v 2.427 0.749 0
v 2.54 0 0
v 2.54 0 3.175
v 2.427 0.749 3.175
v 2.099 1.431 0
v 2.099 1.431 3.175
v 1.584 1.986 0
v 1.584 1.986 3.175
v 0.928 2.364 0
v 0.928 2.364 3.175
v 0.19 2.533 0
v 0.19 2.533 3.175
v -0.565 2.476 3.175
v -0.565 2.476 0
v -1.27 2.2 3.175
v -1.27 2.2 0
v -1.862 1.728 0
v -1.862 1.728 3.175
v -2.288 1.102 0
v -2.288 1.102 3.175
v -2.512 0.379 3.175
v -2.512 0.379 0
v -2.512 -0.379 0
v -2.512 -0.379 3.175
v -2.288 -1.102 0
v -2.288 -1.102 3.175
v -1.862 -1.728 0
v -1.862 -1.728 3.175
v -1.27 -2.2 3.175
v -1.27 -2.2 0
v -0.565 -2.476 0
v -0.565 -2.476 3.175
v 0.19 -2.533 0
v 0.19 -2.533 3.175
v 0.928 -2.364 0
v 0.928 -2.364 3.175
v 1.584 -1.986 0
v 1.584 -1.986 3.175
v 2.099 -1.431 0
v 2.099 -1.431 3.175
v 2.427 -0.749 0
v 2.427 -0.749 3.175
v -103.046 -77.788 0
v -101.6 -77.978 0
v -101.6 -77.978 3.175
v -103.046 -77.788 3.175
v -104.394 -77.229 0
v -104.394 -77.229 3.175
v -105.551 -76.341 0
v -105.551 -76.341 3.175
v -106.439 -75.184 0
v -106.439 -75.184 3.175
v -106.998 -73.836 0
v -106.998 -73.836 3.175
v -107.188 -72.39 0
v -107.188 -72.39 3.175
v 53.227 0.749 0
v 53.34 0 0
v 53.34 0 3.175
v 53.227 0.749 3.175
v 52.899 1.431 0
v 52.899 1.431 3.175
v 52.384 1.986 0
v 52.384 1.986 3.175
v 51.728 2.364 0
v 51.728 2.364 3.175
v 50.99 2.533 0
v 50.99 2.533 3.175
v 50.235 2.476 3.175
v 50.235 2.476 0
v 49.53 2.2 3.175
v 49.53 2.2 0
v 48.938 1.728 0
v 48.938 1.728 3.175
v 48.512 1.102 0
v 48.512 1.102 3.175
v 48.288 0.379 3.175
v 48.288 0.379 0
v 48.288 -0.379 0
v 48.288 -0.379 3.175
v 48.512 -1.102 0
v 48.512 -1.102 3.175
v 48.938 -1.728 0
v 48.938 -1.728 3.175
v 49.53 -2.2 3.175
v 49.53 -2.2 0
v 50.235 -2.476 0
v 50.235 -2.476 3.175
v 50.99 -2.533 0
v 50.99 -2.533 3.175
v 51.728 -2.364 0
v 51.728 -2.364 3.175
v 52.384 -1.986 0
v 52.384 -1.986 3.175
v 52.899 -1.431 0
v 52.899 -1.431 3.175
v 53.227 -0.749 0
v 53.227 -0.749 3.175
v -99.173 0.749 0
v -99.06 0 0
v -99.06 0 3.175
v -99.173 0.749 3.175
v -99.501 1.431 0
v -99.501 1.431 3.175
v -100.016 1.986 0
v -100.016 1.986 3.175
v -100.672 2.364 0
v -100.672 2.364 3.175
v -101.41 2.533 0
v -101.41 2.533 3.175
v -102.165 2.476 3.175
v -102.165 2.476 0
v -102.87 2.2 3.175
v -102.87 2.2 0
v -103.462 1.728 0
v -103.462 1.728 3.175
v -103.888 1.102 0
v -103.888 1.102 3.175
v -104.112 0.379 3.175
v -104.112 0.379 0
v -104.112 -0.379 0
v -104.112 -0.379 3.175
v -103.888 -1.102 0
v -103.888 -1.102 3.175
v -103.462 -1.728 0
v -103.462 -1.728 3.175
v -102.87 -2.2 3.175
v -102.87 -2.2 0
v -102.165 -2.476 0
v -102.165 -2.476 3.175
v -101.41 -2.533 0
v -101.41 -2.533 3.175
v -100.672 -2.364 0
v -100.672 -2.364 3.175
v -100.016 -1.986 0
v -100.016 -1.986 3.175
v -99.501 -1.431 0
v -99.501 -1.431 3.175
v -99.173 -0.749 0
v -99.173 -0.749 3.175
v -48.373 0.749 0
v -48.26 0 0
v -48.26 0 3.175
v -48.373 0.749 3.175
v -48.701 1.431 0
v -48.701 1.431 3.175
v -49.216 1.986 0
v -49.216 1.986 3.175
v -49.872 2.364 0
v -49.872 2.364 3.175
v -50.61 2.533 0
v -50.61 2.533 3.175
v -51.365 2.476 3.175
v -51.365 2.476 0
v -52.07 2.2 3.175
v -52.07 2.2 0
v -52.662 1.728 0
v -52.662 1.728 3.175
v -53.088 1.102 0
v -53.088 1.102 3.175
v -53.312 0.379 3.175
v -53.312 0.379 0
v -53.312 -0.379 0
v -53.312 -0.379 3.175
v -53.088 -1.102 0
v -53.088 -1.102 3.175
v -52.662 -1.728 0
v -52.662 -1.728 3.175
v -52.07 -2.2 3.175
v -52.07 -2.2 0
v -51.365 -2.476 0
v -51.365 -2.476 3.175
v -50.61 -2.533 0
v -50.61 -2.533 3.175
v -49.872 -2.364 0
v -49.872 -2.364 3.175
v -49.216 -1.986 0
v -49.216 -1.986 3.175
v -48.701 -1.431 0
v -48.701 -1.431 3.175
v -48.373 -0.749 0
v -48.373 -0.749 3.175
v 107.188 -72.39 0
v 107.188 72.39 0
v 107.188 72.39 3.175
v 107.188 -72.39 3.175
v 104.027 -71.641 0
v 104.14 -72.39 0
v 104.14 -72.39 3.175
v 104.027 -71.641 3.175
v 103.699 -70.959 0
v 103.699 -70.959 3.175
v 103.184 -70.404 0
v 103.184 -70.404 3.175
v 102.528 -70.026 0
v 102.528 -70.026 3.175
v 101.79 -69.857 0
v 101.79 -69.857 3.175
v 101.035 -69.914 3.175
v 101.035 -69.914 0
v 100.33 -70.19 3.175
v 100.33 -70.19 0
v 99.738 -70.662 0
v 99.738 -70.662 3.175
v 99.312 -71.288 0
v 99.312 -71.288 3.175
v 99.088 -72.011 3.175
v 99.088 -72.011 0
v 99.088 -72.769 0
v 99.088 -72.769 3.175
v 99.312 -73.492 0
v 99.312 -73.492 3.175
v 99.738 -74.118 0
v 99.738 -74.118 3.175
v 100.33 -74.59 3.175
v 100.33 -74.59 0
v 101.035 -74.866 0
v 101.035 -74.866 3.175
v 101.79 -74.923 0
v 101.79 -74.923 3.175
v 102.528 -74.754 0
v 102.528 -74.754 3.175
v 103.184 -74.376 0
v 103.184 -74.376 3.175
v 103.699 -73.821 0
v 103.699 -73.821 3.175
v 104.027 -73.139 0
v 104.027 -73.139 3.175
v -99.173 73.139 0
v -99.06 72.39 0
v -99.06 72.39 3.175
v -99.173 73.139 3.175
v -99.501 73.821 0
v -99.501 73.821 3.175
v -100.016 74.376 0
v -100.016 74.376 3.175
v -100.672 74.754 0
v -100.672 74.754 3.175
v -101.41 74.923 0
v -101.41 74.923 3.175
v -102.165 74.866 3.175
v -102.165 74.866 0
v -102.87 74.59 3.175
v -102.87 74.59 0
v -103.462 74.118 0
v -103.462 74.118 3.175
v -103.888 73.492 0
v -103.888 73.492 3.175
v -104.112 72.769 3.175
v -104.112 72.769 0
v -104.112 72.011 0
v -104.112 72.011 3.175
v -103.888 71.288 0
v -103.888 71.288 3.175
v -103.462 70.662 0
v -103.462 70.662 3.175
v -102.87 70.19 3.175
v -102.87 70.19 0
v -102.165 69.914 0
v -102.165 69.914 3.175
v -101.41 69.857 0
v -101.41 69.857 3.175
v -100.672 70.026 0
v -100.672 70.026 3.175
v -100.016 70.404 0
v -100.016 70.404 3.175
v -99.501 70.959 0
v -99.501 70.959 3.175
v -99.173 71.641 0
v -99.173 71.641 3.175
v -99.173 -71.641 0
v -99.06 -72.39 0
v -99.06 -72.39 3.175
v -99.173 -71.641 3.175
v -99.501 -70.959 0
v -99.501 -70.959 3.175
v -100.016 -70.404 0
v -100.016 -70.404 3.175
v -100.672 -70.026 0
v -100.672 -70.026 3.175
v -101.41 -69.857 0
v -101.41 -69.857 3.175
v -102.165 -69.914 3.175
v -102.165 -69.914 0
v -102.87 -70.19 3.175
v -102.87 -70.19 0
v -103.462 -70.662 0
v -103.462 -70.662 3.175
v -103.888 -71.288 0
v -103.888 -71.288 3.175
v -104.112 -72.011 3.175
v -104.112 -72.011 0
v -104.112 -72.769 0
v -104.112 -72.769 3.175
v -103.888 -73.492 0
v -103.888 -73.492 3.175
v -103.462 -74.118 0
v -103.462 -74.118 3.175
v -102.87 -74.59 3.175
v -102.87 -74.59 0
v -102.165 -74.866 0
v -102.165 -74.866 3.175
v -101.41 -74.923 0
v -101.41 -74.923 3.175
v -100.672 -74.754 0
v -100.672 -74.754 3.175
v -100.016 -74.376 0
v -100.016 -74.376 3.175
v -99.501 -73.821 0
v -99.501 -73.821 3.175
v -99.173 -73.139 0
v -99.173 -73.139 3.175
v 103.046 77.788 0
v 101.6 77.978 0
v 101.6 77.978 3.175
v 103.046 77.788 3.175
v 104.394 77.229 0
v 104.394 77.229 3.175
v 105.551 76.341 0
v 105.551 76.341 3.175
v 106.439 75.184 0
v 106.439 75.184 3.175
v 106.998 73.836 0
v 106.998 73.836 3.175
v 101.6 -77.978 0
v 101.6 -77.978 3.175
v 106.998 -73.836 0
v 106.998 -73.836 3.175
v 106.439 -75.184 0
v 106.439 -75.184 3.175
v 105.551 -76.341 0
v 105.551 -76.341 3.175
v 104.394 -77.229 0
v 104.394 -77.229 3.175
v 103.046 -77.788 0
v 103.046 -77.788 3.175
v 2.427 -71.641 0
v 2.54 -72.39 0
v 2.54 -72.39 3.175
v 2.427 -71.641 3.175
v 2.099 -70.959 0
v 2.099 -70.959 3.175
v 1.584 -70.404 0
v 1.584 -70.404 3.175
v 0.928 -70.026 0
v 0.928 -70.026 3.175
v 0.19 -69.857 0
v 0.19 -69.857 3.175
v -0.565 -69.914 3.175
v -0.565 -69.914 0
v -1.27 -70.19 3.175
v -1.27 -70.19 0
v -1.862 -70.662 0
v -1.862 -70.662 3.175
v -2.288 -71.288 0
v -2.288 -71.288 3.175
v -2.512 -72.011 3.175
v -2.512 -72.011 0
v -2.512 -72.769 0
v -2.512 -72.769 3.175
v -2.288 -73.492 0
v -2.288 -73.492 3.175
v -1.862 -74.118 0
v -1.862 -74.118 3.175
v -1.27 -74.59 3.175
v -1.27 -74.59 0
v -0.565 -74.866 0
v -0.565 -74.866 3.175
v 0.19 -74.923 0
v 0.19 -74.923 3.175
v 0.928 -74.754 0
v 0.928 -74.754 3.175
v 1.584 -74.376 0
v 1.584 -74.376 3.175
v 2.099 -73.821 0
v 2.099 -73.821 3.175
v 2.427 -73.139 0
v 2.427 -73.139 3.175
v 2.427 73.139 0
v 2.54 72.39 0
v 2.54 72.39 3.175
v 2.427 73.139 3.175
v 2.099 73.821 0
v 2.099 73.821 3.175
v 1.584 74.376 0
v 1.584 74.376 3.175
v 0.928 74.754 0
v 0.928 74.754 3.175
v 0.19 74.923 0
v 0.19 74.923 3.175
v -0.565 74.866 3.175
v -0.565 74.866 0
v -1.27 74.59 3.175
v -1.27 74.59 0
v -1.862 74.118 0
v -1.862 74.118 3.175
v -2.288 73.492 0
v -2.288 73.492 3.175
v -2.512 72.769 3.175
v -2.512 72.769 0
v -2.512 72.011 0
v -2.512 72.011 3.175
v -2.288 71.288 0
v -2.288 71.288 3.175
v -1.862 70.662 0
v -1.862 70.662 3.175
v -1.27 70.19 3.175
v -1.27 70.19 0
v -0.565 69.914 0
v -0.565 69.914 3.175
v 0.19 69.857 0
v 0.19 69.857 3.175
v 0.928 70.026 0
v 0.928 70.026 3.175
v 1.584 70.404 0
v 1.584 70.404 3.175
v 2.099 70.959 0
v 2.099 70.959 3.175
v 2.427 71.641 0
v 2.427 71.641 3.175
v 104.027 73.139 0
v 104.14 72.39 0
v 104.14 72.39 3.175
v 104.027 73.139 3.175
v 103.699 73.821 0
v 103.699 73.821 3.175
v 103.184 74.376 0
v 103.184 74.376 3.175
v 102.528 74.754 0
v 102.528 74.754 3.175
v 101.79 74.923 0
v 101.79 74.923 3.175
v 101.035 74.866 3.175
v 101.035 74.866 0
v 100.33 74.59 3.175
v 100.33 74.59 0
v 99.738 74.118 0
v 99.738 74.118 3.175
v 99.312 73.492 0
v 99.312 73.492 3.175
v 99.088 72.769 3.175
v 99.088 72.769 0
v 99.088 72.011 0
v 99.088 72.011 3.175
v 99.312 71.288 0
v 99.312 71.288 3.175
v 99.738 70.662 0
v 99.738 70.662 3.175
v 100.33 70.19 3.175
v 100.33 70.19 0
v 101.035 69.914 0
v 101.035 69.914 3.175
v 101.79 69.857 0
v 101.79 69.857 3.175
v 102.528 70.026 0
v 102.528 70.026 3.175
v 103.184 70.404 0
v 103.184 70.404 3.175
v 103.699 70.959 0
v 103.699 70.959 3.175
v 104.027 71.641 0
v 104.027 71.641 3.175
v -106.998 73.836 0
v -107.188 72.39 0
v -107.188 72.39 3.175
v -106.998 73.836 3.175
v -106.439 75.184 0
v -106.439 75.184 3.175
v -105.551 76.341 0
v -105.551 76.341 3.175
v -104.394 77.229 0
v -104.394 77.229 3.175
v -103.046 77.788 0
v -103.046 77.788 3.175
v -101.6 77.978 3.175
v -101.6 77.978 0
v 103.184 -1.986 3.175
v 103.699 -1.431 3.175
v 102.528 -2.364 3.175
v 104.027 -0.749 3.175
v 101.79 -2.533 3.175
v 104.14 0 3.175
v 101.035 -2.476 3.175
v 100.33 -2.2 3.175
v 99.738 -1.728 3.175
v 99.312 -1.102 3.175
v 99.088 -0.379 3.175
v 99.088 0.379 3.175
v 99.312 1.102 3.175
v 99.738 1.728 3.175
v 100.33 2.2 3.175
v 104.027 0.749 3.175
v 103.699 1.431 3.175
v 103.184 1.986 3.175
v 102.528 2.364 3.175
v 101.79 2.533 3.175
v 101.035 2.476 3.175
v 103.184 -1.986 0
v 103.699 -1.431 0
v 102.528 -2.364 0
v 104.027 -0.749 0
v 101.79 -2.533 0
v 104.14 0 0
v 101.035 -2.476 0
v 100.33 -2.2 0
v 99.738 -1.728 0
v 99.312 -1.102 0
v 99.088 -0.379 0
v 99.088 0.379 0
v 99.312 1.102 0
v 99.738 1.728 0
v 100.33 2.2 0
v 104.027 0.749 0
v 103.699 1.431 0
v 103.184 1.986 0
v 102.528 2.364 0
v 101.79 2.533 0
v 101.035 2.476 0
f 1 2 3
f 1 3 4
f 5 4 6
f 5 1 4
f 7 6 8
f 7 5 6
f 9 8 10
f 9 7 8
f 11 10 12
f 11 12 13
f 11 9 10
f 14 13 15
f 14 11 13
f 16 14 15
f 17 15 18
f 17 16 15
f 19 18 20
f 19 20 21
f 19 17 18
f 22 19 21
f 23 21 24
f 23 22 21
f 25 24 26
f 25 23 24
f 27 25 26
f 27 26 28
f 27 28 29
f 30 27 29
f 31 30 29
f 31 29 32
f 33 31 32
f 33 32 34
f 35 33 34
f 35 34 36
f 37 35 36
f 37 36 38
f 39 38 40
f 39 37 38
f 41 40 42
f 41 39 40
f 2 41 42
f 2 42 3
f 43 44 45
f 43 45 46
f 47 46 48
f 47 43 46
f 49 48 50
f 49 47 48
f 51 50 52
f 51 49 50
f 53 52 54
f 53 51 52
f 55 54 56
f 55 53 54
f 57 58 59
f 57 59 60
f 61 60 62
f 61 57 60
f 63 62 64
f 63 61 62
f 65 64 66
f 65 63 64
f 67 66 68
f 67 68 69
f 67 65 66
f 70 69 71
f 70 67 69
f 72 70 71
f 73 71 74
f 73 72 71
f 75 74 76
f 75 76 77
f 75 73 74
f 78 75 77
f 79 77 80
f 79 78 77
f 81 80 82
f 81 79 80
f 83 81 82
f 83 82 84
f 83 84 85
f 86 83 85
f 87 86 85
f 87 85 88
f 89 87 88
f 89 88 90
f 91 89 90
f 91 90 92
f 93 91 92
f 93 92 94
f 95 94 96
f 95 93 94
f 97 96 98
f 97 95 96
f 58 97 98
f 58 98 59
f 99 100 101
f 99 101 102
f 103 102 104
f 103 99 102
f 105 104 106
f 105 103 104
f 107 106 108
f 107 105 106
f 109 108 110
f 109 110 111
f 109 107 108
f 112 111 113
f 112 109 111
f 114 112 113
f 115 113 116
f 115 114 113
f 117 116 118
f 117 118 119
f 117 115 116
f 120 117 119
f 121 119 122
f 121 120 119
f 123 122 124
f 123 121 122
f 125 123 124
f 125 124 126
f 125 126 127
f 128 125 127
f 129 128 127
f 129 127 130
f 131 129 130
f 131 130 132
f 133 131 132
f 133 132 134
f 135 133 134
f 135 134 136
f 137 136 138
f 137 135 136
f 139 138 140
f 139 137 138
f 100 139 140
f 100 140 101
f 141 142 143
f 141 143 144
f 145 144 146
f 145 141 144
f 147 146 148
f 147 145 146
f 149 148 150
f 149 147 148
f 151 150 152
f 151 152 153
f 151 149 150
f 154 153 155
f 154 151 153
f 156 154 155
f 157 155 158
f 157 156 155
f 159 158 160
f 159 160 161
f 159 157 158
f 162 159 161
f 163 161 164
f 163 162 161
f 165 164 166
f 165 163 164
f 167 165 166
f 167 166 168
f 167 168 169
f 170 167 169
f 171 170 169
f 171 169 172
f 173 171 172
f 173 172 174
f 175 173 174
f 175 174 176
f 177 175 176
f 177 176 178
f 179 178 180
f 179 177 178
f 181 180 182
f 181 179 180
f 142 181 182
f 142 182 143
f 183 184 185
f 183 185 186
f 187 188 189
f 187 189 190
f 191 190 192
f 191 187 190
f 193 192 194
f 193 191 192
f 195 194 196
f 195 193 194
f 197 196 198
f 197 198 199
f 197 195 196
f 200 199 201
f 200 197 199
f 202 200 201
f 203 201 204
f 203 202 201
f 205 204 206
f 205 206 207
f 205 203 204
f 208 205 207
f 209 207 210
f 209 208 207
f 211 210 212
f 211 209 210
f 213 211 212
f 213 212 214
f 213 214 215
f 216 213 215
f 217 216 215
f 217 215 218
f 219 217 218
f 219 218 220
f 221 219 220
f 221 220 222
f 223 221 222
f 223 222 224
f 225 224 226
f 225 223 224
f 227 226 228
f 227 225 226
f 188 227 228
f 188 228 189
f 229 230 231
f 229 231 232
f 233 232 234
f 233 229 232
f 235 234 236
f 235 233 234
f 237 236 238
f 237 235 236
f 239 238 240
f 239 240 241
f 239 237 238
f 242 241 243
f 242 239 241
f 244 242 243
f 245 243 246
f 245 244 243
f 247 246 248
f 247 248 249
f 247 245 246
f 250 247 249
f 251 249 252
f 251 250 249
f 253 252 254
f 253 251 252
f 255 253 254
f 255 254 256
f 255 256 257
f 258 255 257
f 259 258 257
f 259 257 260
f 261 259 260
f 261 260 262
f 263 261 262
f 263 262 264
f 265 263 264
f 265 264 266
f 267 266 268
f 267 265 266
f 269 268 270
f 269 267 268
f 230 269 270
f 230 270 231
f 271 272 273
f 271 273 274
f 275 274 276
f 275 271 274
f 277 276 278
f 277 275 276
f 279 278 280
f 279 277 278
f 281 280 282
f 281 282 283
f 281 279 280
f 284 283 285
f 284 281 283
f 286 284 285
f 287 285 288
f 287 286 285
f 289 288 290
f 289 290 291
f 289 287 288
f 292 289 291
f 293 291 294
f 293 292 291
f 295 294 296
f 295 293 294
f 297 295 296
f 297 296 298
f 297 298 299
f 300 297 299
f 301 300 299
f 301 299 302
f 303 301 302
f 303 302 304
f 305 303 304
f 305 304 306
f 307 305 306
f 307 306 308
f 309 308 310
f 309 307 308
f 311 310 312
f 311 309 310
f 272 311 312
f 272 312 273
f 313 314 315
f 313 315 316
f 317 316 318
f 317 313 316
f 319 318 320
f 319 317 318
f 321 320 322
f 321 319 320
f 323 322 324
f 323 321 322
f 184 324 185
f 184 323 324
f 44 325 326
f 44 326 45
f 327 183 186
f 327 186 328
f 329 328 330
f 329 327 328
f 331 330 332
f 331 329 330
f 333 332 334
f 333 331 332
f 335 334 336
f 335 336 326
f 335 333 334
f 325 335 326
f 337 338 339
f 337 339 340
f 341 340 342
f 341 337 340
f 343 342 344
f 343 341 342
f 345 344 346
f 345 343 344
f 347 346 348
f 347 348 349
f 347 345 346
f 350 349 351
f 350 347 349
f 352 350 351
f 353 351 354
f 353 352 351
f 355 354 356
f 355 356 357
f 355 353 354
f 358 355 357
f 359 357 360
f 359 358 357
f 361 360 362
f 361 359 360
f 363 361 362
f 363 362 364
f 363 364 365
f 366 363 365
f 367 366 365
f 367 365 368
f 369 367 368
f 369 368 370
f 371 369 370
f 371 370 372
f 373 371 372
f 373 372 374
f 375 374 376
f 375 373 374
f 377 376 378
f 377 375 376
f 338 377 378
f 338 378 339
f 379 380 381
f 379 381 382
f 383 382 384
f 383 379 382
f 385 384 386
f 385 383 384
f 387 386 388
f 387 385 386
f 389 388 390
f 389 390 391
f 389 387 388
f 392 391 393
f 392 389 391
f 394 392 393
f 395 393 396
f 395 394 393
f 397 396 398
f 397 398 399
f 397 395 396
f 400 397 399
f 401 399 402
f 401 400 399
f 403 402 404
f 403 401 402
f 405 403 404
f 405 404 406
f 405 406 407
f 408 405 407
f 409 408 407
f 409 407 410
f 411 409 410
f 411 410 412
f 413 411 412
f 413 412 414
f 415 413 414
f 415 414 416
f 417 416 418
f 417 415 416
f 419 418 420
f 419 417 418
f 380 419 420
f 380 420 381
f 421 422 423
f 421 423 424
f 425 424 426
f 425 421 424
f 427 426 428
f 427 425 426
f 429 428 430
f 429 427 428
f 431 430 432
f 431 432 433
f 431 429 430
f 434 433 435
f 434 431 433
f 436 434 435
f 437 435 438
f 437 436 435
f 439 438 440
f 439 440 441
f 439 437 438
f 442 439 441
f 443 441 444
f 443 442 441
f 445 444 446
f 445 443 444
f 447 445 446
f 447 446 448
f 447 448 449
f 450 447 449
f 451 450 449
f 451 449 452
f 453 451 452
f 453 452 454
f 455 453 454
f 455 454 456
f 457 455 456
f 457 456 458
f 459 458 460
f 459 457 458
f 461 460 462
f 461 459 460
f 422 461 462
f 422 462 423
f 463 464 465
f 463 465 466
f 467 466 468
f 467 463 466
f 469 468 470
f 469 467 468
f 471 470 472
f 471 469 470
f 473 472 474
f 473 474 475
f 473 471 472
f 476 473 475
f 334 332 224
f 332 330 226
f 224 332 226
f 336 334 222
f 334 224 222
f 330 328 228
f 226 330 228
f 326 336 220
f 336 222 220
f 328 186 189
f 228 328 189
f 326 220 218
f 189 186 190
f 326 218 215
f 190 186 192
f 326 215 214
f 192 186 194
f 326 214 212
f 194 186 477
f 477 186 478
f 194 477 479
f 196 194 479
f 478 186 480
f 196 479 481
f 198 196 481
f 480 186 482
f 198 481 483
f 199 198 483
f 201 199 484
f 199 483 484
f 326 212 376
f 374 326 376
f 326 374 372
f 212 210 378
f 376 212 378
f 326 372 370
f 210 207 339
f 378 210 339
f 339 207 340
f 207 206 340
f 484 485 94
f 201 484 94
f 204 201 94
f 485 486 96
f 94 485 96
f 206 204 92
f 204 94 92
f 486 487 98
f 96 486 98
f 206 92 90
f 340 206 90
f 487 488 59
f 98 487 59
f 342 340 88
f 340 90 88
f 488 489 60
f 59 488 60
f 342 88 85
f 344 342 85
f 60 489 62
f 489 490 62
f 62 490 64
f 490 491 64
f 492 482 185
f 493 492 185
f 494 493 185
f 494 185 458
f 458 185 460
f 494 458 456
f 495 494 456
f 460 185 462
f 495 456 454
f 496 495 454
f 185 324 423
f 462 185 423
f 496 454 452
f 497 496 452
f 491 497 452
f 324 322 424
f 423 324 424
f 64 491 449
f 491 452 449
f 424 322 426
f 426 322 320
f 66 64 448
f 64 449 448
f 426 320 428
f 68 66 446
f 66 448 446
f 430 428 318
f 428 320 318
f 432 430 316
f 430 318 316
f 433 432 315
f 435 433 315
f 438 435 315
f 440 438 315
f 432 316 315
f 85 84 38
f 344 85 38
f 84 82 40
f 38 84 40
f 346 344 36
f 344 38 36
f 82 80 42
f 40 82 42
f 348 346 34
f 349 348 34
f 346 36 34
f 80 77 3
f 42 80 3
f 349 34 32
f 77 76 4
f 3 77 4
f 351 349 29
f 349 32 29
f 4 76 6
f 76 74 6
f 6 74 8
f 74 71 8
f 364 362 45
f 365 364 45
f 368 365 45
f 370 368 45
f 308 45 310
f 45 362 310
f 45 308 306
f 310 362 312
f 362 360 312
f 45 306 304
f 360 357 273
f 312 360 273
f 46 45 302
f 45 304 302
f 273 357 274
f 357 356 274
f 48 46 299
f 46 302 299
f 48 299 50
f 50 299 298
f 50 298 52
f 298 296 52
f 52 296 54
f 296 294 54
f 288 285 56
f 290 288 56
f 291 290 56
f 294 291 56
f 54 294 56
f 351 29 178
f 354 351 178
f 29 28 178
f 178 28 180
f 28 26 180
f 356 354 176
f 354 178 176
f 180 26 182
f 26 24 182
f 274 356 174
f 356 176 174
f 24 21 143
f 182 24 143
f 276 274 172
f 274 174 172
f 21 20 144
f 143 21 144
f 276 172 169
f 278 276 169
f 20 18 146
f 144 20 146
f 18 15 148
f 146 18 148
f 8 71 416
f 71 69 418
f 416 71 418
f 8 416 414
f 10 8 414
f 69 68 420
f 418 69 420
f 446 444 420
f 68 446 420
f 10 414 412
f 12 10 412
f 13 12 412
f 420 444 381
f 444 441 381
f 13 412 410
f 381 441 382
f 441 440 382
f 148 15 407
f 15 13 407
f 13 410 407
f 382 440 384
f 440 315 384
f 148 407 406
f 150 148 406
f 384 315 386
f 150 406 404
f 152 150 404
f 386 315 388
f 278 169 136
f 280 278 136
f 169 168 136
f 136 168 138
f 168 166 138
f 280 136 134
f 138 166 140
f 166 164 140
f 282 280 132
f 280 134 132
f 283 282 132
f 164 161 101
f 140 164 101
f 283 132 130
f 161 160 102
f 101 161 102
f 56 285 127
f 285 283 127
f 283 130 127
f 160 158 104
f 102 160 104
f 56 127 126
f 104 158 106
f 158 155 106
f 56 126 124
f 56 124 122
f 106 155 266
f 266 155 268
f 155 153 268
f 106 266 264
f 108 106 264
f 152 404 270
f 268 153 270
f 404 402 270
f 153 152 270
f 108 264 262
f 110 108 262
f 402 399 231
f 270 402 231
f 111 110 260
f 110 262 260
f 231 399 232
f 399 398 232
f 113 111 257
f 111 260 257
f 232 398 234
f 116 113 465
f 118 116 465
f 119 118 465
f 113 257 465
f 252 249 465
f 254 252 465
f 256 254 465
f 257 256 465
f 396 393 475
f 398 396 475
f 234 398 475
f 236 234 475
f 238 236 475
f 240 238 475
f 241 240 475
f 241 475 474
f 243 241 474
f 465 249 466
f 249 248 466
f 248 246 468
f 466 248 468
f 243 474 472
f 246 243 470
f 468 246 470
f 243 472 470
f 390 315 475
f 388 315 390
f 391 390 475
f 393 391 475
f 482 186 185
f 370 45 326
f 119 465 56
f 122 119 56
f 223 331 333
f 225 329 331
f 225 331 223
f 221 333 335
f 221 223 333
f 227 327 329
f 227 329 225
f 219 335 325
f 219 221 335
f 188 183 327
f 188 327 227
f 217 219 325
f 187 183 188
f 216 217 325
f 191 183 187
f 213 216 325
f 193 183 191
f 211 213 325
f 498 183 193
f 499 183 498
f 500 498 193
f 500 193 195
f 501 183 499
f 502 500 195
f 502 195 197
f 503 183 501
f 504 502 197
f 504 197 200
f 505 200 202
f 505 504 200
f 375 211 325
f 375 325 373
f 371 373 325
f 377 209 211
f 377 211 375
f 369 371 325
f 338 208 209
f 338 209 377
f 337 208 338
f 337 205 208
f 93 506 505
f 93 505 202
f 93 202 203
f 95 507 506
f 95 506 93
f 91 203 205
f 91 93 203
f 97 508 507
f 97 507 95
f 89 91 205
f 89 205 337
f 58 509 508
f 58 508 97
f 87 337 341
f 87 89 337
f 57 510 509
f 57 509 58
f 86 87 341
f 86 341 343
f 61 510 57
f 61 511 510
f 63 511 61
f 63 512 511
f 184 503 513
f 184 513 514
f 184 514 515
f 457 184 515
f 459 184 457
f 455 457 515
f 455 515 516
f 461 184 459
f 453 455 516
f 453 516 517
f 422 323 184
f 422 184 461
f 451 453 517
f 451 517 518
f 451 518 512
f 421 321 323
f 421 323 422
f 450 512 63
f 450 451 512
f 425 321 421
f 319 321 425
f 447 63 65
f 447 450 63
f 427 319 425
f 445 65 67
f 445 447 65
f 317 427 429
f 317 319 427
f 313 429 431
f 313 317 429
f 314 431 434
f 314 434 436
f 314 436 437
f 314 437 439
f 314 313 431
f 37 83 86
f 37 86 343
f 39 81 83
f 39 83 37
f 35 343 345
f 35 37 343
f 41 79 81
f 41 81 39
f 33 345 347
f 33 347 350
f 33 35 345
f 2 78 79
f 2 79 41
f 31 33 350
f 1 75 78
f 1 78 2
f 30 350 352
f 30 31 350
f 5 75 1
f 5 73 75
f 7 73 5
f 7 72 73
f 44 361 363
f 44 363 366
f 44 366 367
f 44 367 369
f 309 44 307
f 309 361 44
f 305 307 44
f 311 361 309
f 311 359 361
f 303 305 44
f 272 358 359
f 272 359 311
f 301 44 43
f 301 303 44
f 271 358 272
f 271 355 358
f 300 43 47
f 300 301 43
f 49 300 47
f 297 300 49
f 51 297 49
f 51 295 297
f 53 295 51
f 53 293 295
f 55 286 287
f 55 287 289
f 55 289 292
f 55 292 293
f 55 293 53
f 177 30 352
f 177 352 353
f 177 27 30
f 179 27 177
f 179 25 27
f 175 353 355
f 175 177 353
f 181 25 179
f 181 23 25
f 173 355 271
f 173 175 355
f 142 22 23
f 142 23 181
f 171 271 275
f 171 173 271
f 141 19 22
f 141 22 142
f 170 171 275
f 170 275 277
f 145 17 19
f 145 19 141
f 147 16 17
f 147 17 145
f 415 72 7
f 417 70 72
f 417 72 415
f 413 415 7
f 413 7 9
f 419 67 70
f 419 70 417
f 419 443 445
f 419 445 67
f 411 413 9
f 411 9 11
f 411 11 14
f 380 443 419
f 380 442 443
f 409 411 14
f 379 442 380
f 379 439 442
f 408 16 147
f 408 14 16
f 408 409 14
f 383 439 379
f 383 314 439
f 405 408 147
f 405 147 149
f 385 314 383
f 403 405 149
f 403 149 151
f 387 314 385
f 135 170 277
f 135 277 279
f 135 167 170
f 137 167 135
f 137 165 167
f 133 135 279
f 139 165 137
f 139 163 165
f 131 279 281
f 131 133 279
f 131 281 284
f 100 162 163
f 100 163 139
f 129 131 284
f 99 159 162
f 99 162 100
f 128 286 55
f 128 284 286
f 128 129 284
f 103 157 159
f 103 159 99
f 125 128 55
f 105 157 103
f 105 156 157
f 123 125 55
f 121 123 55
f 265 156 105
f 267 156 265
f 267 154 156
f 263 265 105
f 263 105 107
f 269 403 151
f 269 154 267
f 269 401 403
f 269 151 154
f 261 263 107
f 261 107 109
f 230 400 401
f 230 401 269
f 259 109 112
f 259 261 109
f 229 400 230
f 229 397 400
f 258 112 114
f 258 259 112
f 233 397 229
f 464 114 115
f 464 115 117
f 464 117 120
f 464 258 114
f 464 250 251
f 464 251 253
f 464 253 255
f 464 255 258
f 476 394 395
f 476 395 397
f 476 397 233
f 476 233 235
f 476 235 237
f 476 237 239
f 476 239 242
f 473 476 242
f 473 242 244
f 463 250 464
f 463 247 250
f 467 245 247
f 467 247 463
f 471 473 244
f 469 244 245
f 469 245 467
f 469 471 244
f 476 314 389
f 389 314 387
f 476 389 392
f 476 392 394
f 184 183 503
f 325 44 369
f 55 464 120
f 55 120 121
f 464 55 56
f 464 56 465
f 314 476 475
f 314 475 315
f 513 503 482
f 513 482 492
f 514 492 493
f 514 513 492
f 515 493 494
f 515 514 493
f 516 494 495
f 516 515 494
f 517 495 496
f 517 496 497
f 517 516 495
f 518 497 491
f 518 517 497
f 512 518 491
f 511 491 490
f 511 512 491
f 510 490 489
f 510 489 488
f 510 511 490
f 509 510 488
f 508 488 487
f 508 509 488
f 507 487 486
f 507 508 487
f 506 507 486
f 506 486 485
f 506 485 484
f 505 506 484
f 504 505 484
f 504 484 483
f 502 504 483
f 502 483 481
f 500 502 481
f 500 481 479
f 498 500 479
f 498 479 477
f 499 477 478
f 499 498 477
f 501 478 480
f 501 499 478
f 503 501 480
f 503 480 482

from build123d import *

# Parameters (mm, degrees)
SKETCH1_R           = 2.54
BOSS_EXTRUDE1_DEPTH = 3.175


with BuildPart() as part:
    # Sketch1 → Boss-Extrude1 (new body)
    with BuildSketch(Plane.XY):
        with BuildLine():
            Line((-101.6, 77.978), (101.6, 77.978))
            ThreePointArc((101.6, 77.978), (105.551312693, 76.341312693), (107.188, 72.39))
            Line((107.188, 72.39), (107.188, 24.765))
            Line((107.188, 24.765), (107.188, -24.765))
            Line((107.188, -24.765), (107.188, -72.39))
            ThreePointArc((107.188, -72.39), (105.551312693, -76.341312693), (101.6, -77.978))
            Line((101.6, -77.978), (-101.6, -77.978))
            ThreePointArc((-101.6, -77.978), (-105.551312693, -76.341312693), (-107.188, -72.39))
            Line((-107.188, -72.39), (-107.188, -24.765))
            Line((-107.188, -24.765), (-107.188, 24.765))
            Line((-107.188, 24.765), (-107.188, 72.39))
            ThreePointArc((-107.188, 72.39), (-105.551312693, 76.341312693), (-101.6, 77.978))
        make_face()
        with Locations((-101.6, 0)):
            Circle(SKETCH1_R, mode=Mode.SUBTRACT)
        with Locations((-50.8, 0)):
            Circle(SKETCH1_R, mode=Mode.SUBTRACT)
        Circle(SKETCH1_R, mode=Mode.SUBTRACT)
        with Locations((101.6, 0)):
            Circle(SKETCH1_R, mode=Mode.SUBTRACT)
        with Locations((50.8, 0)):
            Circle(SKETCH1_R, mode=Mode.SUBTRACT)
        with Locations((-101.6, 72.39)):
            Circle(SKETCH1_R, mode=Mode.SUBTRACT)
        with Locations((0, 72.39)):
            Circle(SKETCH1_R, mode=Mode.SUBTRACT)
        with Locations((101.6, 72.39)):
            Circle(SKETCH1_R, mode=Mode.SUBTRACT)
        with Locations((-101.6, -72.39)):
            Circle(SKETCH1_R, mode=Mode.SUBTRACT)
        with Locations((0, -72.39)):
            Circle(SKETCH1_R, mode=Mode.SUBTRACT)
        with Locations((101.6, -72.39)):
            Circle(SKETCH1_R, mode=Mode.SUBTRACT)
    extrude(amount=BOSS_EXTRUDE1_DEPTH)


solid = part.part
